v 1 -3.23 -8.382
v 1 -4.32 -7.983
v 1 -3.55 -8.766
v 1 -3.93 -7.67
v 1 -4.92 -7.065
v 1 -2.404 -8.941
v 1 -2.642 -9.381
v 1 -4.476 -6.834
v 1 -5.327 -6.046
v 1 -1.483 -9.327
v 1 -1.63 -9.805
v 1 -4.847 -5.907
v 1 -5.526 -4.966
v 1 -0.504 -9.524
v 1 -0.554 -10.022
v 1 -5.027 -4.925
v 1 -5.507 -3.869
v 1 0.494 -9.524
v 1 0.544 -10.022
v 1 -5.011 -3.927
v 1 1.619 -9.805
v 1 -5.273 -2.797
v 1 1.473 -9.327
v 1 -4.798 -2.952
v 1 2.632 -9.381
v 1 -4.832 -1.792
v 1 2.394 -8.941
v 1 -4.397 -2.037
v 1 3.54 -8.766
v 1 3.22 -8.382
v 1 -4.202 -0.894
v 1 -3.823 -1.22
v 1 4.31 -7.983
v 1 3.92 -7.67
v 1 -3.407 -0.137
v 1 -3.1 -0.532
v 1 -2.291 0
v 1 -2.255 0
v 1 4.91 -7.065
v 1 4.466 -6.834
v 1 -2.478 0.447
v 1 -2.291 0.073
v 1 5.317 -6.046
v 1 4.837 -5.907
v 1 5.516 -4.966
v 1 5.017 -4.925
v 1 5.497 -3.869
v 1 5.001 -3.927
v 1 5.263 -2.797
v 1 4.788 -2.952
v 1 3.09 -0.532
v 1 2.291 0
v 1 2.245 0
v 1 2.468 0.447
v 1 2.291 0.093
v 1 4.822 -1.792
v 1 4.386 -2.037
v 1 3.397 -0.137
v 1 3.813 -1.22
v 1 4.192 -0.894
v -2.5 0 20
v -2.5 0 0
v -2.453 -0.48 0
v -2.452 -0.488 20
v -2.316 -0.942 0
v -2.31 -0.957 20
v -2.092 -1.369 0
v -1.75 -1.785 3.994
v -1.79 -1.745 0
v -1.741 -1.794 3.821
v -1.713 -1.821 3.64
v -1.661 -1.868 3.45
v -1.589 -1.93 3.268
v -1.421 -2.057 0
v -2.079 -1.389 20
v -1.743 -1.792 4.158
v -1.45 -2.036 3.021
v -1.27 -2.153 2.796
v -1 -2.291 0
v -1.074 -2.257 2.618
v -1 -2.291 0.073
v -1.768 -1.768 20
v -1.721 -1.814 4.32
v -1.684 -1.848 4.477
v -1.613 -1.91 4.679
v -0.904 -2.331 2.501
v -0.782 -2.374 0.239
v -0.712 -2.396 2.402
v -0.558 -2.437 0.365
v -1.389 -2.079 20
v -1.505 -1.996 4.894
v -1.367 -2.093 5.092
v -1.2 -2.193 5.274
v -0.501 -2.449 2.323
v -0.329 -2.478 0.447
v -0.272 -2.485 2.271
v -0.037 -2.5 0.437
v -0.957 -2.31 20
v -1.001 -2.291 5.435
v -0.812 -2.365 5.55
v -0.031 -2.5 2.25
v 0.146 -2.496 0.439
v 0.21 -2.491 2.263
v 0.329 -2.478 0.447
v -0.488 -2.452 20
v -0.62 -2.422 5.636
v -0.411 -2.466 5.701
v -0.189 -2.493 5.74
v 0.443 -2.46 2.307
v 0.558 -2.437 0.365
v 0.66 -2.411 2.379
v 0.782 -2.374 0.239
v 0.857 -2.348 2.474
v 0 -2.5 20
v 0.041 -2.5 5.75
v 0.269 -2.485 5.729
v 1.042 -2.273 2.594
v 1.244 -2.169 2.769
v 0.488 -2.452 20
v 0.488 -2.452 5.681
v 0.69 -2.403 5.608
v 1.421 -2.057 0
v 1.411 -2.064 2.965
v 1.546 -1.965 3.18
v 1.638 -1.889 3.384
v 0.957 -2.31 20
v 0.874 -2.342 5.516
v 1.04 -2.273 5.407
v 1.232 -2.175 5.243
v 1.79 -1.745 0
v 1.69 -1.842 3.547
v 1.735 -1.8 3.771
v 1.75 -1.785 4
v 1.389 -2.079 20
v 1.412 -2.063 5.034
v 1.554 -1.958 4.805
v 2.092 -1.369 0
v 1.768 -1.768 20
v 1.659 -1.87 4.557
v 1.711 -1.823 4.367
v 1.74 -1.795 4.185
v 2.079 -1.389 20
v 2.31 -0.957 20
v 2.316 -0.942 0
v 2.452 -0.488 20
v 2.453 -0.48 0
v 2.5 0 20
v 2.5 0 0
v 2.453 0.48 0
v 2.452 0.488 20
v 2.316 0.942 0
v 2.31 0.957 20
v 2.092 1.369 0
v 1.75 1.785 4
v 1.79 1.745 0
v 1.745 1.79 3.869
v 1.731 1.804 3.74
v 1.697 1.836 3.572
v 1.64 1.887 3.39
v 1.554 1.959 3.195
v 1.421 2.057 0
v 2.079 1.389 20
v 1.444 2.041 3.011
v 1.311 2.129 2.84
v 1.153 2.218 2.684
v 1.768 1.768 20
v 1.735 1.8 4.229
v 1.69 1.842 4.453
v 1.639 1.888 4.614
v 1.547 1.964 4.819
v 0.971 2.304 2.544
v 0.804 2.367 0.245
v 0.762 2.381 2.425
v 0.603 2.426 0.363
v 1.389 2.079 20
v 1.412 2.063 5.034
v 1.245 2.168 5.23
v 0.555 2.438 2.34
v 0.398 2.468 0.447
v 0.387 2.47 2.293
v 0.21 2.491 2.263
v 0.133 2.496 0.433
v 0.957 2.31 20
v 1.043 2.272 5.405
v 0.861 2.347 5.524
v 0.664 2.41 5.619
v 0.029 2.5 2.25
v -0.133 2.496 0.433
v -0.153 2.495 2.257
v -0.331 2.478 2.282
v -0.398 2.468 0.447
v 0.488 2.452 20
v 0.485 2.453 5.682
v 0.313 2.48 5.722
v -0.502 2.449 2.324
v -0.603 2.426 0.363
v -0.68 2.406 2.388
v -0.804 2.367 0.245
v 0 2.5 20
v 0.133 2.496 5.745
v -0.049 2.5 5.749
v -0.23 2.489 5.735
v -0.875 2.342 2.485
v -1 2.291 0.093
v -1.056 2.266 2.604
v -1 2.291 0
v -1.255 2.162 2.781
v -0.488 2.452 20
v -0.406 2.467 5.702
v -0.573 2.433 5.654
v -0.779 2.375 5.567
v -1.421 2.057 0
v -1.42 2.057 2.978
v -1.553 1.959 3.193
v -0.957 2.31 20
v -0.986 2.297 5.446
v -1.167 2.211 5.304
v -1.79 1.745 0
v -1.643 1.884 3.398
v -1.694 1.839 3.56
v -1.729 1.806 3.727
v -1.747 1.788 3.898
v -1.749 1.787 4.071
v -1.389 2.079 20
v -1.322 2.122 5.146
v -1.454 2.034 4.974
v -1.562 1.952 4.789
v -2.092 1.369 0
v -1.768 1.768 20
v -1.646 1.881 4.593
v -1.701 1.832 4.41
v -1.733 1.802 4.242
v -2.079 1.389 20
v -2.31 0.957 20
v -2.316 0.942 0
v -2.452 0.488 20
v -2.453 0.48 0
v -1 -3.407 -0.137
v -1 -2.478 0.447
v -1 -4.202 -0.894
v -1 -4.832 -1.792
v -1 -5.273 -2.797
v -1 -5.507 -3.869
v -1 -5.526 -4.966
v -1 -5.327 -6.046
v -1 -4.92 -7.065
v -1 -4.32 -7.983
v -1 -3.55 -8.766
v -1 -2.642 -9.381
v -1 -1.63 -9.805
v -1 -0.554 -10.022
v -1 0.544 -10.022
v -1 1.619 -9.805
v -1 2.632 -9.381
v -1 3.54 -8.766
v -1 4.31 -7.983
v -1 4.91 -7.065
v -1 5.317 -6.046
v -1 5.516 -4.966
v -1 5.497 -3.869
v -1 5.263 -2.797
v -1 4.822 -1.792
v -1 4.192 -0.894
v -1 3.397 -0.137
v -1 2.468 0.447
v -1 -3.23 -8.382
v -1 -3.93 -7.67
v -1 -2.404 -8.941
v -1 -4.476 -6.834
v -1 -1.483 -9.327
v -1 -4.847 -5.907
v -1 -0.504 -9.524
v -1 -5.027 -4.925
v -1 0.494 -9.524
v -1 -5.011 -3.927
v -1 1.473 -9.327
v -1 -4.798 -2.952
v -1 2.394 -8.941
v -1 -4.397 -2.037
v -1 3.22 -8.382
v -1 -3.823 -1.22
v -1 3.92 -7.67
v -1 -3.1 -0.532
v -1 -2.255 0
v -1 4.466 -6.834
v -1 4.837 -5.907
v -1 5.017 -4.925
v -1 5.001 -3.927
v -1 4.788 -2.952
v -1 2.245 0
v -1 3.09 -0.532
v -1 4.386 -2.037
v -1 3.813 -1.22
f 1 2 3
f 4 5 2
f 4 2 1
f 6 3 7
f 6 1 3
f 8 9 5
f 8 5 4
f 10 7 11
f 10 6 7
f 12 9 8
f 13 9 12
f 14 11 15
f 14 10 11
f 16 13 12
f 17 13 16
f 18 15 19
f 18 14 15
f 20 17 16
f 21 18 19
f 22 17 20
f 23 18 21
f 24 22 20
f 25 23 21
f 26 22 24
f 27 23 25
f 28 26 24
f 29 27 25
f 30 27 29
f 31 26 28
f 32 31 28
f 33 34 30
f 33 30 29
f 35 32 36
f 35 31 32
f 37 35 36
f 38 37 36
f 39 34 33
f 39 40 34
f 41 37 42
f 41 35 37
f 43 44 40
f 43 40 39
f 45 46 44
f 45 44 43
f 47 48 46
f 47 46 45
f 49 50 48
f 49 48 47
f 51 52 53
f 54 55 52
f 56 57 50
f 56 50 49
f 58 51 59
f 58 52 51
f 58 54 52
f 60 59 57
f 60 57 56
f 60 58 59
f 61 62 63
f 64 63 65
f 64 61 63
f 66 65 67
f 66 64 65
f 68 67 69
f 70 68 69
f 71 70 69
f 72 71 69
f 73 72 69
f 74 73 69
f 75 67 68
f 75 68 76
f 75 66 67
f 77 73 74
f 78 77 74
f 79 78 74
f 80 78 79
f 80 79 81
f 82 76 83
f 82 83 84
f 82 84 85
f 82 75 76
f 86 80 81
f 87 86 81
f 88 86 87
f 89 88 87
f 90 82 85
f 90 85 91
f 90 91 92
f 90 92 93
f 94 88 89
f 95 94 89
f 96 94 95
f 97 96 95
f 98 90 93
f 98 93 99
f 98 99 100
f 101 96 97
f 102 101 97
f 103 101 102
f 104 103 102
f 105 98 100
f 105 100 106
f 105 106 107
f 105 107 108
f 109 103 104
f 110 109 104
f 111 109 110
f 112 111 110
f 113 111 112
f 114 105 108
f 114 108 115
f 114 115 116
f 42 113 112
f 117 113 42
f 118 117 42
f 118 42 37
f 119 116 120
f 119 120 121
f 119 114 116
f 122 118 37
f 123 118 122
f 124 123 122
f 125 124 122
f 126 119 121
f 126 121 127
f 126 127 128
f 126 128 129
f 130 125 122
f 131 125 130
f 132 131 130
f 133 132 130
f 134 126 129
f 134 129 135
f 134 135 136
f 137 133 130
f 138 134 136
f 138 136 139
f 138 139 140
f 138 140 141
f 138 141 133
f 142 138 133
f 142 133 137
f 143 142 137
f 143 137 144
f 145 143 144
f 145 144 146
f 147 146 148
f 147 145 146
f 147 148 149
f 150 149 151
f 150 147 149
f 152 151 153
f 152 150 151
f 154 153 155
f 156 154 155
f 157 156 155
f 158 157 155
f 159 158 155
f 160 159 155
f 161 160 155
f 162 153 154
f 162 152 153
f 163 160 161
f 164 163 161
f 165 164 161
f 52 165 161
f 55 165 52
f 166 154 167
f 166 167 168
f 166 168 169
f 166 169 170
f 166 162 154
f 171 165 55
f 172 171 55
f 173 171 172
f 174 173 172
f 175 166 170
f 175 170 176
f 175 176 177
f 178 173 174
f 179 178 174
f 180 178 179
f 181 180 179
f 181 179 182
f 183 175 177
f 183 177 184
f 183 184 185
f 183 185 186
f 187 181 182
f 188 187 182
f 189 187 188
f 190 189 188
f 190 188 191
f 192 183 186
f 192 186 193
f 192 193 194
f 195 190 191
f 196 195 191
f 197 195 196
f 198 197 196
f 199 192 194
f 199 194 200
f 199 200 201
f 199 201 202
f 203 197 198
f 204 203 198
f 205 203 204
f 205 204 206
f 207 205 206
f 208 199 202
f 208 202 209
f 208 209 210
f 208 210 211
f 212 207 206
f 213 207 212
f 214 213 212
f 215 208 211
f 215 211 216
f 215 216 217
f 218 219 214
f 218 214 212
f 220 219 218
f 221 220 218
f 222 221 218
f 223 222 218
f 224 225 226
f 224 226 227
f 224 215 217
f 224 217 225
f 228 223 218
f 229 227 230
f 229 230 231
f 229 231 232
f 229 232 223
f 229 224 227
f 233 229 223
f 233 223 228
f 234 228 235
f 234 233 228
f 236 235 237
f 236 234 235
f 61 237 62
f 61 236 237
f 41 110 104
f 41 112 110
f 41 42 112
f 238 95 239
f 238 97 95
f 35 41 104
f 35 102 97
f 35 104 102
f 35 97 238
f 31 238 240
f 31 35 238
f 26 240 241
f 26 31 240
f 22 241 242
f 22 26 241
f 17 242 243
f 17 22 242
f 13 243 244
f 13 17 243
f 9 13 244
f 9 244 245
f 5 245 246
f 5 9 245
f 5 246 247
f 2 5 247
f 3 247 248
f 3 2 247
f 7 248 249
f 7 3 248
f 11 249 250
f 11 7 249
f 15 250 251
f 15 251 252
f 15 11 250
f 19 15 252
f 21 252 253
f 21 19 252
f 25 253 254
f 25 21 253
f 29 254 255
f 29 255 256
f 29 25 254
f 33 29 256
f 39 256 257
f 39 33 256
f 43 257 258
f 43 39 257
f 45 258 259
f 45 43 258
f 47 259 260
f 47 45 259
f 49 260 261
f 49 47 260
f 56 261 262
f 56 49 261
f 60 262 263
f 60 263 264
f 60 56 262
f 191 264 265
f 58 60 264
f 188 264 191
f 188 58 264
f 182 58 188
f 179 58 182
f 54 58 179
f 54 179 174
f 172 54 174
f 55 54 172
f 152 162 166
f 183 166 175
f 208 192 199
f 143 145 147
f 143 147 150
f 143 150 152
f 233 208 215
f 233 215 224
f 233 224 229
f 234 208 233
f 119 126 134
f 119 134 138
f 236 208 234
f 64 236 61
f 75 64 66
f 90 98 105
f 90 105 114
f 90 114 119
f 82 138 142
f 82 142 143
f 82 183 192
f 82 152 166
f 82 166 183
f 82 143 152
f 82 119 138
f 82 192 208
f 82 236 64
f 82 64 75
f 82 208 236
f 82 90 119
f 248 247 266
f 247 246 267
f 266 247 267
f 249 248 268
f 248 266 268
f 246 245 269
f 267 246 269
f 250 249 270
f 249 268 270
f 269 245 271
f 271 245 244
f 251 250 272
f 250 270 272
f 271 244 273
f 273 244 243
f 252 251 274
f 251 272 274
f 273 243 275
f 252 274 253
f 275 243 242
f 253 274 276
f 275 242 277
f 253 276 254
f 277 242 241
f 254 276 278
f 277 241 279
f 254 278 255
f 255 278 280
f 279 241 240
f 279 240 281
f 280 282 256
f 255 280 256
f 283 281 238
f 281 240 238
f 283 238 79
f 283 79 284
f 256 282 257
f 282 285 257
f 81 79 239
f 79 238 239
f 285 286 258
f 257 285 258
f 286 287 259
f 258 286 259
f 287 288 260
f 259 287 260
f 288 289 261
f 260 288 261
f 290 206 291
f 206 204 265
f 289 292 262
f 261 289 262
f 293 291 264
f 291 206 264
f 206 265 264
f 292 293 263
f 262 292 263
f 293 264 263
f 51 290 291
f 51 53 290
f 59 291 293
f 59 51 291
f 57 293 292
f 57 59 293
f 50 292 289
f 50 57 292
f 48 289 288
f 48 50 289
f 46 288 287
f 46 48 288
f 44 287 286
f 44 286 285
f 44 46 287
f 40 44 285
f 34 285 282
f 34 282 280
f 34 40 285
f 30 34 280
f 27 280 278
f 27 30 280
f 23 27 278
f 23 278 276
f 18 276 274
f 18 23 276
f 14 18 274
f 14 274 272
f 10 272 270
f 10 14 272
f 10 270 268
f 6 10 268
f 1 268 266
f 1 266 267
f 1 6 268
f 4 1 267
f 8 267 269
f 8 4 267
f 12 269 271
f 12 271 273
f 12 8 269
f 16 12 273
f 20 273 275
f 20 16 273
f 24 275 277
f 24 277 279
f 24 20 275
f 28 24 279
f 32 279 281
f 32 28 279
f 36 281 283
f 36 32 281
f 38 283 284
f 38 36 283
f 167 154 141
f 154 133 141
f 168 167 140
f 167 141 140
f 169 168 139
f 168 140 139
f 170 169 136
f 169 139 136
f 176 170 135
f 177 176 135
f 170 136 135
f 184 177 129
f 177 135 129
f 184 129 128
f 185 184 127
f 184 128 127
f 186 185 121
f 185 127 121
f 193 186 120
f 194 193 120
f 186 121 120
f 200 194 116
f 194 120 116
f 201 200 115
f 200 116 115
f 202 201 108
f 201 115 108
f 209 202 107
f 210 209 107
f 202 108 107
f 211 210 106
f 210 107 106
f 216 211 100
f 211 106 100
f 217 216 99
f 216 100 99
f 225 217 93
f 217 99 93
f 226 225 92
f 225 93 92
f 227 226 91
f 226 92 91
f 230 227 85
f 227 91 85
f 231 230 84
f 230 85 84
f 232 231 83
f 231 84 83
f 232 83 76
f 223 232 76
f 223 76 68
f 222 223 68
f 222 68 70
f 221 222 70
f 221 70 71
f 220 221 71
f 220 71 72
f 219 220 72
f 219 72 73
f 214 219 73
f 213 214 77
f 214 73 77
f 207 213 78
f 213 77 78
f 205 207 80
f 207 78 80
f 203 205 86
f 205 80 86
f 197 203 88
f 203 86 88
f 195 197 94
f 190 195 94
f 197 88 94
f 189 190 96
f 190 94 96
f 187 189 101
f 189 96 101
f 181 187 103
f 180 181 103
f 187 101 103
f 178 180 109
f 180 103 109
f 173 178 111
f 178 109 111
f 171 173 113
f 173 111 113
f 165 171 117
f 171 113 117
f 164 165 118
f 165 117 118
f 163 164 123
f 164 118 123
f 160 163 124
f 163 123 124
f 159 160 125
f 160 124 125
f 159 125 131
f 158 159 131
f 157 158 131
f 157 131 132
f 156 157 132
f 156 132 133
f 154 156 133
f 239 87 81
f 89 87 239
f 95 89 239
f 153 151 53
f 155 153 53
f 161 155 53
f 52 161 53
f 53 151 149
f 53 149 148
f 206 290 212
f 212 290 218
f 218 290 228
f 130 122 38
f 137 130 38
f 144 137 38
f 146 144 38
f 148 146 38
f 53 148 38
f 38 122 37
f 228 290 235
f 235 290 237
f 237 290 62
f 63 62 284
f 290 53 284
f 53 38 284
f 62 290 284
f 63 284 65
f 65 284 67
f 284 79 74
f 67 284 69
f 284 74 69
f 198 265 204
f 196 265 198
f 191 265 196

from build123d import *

# Parameters (mm, degrees)
F0_W     = 2.5
F0_H     = 20
F2_R     = 1.75
F3_DEPTH = 2.5
F5_DEPTH = 1


with BuildPart() as f1:
    # F0 (on Front) → F1 (revolve)
    with BuildSketch(Plane.XZ):
        with Locations((-1.25, 10)):
            Rectangle(F0_W, F0_H)
    revolve(axis=Axis((0, 0, 10), (0, 0, 1)))

    # F2 (on Front) → F3 (cut, symmetric)
    with BuildSketch(Plane.XZ):
        with Locations((0, 4)):
            Circle(F2_R)
    extrude(amount=F3_DEPTH, both=True, mode=Mode.SUBTRACT)

    # F4 (on Right) → F5 (join, symmetric)
    with BuildSketch(Plane.YZ):
        with BuildLine():
            ThreePointArc((2.244925, 0), (-0.005075, -9.548809), (-2.255075, 0))
            Line((-2.255075, 0), (-2.478312, 0.447398))
            ThreePointArc((-2.478312, 0.447398), (-0.005075, -10.048809), (2.468162, 0.447398))
            Line((2.468162, 0.447398), (2.244925, 0))
        make_face()
    extrude(amount=F5_DEPTH, both=True)


solid = f1.part
